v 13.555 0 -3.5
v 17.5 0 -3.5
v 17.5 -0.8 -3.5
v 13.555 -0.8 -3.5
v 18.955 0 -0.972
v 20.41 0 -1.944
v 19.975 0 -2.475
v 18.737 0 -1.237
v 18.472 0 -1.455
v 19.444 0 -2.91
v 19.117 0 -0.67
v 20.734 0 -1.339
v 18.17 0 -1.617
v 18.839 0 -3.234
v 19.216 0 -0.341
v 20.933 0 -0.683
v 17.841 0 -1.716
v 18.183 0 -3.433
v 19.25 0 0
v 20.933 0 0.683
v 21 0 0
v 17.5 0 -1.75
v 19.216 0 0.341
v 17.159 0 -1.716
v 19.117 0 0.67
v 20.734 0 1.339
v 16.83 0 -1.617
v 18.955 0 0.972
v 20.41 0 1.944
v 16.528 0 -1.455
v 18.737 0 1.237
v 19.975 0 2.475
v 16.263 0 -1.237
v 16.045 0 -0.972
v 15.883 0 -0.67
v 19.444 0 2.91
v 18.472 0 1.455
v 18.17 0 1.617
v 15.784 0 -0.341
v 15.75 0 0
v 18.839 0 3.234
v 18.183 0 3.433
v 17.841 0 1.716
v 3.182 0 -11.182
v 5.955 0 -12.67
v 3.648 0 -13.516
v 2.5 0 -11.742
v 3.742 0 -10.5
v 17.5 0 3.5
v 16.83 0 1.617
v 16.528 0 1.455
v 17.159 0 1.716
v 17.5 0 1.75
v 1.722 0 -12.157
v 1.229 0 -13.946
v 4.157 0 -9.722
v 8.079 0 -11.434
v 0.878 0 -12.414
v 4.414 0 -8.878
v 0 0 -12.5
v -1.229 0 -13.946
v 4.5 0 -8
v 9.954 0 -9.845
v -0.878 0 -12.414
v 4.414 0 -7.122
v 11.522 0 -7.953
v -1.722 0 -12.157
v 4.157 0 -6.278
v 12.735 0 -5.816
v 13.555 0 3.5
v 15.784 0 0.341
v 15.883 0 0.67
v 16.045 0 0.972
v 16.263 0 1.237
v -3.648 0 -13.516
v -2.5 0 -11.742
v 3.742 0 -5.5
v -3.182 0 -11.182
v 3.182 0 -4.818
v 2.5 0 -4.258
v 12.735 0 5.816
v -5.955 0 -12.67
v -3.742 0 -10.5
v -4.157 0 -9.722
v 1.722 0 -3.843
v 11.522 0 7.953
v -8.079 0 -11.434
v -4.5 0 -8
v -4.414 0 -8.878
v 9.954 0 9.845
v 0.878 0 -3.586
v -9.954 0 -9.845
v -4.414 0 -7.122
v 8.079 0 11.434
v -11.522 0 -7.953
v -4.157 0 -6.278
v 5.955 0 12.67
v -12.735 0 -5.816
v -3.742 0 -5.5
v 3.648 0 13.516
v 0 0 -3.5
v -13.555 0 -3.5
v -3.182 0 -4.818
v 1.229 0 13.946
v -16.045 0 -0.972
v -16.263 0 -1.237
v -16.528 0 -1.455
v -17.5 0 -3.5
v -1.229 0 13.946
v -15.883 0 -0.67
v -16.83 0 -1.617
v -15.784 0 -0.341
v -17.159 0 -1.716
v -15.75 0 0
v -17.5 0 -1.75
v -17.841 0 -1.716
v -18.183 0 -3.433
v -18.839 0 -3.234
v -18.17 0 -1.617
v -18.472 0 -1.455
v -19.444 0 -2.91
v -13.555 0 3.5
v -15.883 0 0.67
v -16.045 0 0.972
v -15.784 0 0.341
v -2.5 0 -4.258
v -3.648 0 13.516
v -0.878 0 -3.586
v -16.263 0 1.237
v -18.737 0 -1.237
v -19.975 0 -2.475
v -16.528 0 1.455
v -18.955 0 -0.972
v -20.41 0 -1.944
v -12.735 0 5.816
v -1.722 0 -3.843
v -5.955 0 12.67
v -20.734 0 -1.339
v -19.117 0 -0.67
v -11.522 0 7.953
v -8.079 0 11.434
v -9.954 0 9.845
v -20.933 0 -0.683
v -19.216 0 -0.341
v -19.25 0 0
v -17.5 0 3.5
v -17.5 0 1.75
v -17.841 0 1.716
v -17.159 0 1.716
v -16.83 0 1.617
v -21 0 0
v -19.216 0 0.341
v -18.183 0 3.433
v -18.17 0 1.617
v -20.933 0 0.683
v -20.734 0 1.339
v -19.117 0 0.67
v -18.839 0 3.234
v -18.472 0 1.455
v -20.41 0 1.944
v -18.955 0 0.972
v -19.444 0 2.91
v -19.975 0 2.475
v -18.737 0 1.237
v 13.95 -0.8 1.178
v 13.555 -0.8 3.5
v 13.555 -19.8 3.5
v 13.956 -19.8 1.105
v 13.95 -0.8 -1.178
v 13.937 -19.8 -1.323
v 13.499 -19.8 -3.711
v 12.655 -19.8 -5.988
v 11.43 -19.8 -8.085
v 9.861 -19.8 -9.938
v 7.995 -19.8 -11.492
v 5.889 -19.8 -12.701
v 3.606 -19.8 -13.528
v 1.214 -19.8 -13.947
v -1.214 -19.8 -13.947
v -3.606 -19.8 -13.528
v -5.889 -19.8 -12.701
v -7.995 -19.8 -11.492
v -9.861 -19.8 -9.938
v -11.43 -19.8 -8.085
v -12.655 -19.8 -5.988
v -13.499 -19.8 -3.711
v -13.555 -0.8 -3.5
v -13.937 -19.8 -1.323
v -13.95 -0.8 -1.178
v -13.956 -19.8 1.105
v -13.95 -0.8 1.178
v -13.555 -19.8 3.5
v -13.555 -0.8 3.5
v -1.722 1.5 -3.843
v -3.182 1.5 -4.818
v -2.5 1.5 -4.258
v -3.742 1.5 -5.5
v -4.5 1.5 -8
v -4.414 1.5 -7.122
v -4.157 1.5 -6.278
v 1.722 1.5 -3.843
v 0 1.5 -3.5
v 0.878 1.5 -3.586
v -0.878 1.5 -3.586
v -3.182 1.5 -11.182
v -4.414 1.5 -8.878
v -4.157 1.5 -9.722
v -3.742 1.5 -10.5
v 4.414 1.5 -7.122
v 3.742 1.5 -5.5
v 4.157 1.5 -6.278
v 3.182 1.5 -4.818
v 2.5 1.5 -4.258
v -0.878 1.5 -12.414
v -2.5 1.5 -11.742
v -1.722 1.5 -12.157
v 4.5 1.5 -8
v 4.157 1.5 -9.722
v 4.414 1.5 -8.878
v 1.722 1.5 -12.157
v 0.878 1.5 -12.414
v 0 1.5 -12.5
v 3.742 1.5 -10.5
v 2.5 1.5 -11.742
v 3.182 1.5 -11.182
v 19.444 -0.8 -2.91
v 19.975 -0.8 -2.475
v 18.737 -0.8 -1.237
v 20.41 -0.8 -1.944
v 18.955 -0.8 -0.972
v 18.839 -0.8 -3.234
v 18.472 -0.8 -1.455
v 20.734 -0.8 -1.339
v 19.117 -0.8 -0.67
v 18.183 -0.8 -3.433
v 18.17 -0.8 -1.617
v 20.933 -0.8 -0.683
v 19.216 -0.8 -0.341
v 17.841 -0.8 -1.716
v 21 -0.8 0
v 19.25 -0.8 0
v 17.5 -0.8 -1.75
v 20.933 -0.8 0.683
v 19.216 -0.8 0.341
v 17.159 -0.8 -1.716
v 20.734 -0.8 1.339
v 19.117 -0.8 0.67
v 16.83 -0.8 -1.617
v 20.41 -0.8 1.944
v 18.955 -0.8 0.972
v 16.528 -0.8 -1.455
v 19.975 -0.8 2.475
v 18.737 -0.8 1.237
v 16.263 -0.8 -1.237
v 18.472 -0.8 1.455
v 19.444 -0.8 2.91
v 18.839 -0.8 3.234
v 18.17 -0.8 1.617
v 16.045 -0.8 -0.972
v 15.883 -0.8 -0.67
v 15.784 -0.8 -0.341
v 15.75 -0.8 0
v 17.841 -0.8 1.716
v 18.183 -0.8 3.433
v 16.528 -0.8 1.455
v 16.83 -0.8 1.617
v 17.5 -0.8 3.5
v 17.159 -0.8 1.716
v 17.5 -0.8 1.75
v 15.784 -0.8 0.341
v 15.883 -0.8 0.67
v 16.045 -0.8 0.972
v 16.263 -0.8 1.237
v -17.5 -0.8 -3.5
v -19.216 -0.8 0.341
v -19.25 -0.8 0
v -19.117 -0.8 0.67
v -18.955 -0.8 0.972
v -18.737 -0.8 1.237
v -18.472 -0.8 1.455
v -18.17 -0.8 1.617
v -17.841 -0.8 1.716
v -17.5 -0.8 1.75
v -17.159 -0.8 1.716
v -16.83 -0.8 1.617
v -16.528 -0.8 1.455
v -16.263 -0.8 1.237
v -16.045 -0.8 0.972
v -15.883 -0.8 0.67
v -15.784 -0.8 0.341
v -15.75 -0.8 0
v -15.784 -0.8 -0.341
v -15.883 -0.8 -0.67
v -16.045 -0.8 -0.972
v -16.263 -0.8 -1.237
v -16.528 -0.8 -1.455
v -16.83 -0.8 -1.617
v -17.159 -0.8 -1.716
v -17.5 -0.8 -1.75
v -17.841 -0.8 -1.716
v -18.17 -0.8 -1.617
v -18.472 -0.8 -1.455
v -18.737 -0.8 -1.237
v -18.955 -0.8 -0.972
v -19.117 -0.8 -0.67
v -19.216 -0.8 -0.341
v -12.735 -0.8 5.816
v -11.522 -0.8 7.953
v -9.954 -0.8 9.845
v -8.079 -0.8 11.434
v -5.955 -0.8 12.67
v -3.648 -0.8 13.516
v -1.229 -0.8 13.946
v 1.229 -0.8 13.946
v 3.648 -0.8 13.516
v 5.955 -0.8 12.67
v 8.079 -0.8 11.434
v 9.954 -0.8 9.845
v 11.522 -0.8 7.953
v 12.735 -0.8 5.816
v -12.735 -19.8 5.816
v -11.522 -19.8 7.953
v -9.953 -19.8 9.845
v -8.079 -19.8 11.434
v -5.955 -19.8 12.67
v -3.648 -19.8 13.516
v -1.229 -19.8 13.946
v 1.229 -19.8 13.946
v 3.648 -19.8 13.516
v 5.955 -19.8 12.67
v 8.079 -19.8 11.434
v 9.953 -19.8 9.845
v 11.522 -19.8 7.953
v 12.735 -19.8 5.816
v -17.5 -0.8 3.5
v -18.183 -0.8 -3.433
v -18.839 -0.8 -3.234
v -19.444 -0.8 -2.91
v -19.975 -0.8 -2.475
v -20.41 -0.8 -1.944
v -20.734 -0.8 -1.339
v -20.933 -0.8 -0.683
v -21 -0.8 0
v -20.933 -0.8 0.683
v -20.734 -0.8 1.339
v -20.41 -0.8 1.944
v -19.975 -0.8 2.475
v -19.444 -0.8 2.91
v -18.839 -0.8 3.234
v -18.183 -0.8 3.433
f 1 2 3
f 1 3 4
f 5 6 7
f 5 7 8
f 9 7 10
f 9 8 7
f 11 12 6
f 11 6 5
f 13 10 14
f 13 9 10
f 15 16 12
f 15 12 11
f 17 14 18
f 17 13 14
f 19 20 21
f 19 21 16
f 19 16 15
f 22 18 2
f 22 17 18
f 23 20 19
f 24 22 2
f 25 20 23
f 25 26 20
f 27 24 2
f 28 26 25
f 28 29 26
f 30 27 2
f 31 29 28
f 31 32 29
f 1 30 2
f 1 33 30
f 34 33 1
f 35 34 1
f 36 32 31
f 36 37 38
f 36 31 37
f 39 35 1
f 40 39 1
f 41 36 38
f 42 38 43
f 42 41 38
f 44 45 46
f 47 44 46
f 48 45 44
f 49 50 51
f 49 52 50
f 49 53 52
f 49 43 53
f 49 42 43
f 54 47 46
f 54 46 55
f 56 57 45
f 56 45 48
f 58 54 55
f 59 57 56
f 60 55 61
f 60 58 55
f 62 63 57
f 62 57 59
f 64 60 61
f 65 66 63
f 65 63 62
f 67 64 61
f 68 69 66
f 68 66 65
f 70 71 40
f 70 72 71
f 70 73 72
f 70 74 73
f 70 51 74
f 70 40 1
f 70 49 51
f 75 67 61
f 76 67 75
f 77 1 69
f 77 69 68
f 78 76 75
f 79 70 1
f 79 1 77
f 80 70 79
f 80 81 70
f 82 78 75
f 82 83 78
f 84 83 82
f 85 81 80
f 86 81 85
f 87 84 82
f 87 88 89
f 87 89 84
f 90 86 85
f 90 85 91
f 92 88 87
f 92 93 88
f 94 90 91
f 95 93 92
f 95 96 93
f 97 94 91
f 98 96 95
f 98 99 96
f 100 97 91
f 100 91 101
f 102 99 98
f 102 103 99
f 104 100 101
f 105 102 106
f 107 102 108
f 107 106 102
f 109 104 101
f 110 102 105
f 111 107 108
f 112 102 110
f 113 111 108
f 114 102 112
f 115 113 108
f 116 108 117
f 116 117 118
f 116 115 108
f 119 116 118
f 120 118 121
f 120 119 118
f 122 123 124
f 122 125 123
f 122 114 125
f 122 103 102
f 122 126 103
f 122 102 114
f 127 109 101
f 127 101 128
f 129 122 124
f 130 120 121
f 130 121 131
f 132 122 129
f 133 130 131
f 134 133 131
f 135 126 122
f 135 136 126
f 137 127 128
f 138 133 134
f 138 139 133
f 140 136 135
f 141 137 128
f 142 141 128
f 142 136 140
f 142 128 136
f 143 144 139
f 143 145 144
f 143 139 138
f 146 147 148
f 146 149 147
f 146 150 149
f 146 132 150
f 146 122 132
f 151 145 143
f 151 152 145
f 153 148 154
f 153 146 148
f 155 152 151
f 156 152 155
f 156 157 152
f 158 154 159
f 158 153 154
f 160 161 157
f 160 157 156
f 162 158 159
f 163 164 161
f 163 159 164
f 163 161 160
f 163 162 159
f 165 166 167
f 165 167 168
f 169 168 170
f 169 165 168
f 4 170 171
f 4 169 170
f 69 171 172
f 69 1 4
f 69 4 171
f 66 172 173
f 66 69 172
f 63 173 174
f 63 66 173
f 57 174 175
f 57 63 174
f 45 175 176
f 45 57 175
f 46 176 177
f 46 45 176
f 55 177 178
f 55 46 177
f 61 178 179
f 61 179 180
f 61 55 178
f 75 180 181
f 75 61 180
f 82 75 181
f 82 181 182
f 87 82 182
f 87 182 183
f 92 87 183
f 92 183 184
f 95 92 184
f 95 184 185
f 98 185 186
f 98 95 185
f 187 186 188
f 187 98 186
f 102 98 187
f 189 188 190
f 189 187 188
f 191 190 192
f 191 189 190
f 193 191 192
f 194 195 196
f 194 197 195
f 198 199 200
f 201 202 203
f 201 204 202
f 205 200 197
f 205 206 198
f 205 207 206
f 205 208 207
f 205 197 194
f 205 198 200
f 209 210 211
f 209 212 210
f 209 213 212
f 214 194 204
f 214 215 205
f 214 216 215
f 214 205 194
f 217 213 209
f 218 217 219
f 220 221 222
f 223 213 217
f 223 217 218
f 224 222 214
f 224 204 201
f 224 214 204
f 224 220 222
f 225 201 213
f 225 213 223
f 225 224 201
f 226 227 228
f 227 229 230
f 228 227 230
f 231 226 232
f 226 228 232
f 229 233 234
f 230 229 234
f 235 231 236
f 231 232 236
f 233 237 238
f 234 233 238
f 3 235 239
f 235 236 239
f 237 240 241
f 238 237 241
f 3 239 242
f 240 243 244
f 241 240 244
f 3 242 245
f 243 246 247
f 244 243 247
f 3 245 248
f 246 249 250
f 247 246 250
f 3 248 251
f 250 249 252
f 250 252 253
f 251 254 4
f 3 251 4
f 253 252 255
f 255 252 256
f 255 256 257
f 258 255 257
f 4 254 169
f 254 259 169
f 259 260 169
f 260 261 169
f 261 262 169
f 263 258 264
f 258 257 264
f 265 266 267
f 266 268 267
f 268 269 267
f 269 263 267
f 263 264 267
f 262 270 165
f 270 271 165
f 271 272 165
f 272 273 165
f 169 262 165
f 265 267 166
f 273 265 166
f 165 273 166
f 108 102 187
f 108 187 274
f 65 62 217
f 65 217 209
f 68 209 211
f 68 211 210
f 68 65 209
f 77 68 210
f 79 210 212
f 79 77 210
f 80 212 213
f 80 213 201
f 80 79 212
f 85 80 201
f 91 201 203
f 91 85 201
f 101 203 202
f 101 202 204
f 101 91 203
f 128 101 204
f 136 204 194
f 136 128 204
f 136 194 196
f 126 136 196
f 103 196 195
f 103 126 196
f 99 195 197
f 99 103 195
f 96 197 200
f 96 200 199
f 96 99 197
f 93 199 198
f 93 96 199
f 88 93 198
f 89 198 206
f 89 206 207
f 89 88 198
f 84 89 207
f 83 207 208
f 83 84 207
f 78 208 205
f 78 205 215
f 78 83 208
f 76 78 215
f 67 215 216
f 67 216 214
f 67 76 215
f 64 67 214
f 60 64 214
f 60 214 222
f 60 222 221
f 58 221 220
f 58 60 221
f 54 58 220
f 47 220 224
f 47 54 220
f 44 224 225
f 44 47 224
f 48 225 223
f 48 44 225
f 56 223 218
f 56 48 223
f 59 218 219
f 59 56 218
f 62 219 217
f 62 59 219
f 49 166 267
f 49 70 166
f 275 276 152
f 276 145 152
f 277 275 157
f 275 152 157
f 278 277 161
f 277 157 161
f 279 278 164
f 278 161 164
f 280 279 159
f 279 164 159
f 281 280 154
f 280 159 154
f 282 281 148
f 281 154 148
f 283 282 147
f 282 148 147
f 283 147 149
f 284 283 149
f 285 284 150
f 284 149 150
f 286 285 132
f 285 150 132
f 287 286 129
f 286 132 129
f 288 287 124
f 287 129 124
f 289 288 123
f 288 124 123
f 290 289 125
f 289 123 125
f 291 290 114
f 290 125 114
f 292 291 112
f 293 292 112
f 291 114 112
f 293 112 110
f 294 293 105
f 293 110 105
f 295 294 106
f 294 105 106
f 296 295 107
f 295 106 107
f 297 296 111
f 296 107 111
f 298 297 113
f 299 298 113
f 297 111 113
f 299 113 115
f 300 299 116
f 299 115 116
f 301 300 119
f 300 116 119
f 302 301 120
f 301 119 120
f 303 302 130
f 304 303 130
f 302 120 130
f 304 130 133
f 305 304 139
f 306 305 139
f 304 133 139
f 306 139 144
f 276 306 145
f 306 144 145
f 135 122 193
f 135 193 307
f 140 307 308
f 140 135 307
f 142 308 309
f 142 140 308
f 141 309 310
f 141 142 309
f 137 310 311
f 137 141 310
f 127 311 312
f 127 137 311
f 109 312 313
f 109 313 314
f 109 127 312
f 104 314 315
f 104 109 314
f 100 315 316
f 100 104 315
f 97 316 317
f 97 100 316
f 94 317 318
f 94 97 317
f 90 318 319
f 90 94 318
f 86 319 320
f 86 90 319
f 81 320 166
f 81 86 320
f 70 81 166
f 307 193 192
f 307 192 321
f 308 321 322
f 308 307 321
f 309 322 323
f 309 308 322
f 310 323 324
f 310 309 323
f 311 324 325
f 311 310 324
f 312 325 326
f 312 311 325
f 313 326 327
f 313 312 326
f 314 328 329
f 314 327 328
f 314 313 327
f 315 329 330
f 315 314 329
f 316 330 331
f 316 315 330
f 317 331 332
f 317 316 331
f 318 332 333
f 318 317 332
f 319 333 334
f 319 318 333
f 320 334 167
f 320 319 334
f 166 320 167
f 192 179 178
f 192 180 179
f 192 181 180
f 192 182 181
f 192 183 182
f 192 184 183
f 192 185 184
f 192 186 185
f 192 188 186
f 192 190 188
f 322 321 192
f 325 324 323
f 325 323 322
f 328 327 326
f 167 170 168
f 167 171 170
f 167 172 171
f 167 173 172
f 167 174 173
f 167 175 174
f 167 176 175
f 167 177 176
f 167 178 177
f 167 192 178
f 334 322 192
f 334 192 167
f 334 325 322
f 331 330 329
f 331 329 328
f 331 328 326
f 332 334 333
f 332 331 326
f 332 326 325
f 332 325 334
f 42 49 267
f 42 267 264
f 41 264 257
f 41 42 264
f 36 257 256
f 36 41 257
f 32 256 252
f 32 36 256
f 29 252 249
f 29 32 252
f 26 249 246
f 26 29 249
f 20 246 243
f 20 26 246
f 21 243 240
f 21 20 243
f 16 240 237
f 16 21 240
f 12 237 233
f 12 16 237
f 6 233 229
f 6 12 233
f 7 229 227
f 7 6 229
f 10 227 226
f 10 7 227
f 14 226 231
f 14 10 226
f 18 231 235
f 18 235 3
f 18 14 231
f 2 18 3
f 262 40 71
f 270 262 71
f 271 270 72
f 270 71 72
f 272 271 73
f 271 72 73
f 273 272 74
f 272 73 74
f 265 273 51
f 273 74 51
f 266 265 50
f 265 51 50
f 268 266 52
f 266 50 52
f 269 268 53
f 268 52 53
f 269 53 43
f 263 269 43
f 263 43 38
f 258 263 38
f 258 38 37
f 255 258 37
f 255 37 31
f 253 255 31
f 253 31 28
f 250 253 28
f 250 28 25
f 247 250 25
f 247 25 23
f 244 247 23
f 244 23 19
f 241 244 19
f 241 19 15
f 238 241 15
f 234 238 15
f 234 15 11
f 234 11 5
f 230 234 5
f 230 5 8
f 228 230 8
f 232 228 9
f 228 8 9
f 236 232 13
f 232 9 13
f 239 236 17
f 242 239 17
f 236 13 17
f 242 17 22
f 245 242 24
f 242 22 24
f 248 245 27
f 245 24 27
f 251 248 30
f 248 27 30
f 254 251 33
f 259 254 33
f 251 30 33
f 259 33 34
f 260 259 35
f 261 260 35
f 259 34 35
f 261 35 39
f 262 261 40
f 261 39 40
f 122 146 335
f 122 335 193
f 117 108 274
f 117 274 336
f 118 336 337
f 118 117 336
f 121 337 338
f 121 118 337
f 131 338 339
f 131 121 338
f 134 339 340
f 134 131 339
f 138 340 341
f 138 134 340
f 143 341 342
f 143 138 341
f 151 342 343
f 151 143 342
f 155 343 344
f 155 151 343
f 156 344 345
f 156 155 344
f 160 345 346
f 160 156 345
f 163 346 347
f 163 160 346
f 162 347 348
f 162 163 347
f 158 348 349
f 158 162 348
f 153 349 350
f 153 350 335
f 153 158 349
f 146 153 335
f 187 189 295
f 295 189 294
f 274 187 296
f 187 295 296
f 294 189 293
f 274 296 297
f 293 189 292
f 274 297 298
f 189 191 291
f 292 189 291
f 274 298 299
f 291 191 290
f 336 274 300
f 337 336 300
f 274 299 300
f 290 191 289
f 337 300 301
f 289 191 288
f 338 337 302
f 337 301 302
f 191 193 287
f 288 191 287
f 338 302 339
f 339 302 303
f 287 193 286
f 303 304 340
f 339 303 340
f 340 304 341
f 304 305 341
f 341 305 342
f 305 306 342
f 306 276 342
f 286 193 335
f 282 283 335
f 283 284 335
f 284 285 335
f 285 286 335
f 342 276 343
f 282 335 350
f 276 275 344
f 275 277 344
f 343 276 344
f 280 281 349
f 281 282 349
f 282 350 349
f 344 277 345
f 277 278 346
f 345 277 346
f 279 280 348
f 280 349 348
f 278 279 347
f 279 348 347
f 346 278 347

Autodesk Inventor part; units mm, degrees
ref_plane "YZ Plane" through (0, 0, 0) normal (1, 0, 0) x (0, 1, 0)
ref_plane "XZ Plane" through (0, 0, 0) normal (0, 1, 0) x (-1, 0, 0)
ref_plane "XY Plane" through (0, 0, 0) normal (0, 0, 1) x (1, 0, 0)
sketch "Sketch1" plane through (0, 0, 0) normal (0, 1, 0) x (-1, 0, 0)
  line L0 (17.5, 0) -> (-17.5, 0) construction
  line L1 (17.5, 3.5) -> (-17.5, 3.5)
  line L2 (-17.5, -3.5) -> (17.5, -3.5)
  arc A0 (17.5, -3.5) -> (17.5, 3.5) centre (17.5, 0) ccw
  arc A1 (-17.5, 3.5) -> (-17.5, -3.5) centre (-17.5, 0) ccw
  circle A2 centre (-17.5, 0) radius 1.75
  circle A3 centre (17.5, 0) radius 1.75
  circle A4 centre (0, 0) radius 14
  dimension "d0" = 17.5
  dimension "d1" = 7
  dimension "d2" = 3.5
  dimension "d3" = 3.5
  dimension "d4" = 28
extrude "Extrusion1" add sketch "Sketch1" against normal blind 0.8
sketch "Sketch2" plane through (0, 0, 0) normal (0, 1, 0) x (1, 0, 0)
  arc A0 (-13.5554, -3.5) -> (13.5554, -3.5) centre (0, 0) ccw projected
  line L0 (17.5, 3.5) -> (13.5554, 3.5) projected
  line L1 (0, 0) -> (0, 8)
  line L2 (0, 0) -> (8, 0) construction
  circle A1 centre (0, 8) radius 4.5
  dimension "d7" = 8
  dimension "d8" = 90
  dimension "d9" = 9
extrude "Extrusion2" add sketch "Sketch2" along normal blind 1.5
sketch "Sketch3" plane through (0, 1.5, -8) normal (0, 1, 0) x (1, 0, 0)
  circle A0 centre (0, 0) radius 4.5 projected
  circle A1 centre (0, 0) radius 2.5
  point P0 (0, -8)
  dimension "d12" = 5
extrude "Extrusion3" [suppressed]
sketch "Sketch4" plane through (0, 4, -8) normal (0, 1, 0) x (1, 0, 0)
  circle A0 centre (0, 0) radius 2.5 projected
  line L0 (2, -1.5) -> (-2, -1.5)
  line L1 (-2, -1.5) -> (-2, 1.5)
  line L2 (-2, 1.5) -> (2, 1.5)
  line L3 (2, 1.5) -> (2, -1.5)
  line L4 (2, -1.5) -> (-2, 1.5) construction
  line L5 (-2, -1.5) -> (2, 1.5) construction
  arc A1 (-2, 1.5) -> (-2, -1.5) centre (0, 0) ccw
  arc A2 (2, 1.5) -> (-2, 1.5) centre (0, 0) ccw
  arc A3 (2, -1.5) -> (2, 1.5) centre (0, 0) ccw
  arc A4 (-2, -1.5) -> (2, -1.5) centre (0, 0) ccw
  point P0 (0, -8)
  dimension "d15" = 3
extrude "Extrusion4" [suppressed]
sketch "Sketch5" plane through (0, -0.8, 0) normal (0, -1, 0) x (1, 0, 0)
  arc A0 (13.5554, 3.5) -> (-13.5554, 3.5) centre (0, 0) ccw projected
  circle A1 centre (0, 0) radius 14
  dimension "d18" = 28
extrude "Extrusion5" add sketch "Sketch5" along normal blind 19
equation "\"d0\" = 0.5 * stepper_screw_space"
equation "\"wood_thickness\" = 5.08"
equation "\"m3_diameter\" = 3.15"
equation "\"m5_diameter\" = 5.25"
equation "\"stepper_screw_space\" = 35"
equation "\"stepper_shaft_diameter\" = 5"
equation "\"stepper_body_diameter\" = 28"
equation "\"laser_body_diameter\" = 12"
properties part number "small_stepper" material "Bronze, Cast"
